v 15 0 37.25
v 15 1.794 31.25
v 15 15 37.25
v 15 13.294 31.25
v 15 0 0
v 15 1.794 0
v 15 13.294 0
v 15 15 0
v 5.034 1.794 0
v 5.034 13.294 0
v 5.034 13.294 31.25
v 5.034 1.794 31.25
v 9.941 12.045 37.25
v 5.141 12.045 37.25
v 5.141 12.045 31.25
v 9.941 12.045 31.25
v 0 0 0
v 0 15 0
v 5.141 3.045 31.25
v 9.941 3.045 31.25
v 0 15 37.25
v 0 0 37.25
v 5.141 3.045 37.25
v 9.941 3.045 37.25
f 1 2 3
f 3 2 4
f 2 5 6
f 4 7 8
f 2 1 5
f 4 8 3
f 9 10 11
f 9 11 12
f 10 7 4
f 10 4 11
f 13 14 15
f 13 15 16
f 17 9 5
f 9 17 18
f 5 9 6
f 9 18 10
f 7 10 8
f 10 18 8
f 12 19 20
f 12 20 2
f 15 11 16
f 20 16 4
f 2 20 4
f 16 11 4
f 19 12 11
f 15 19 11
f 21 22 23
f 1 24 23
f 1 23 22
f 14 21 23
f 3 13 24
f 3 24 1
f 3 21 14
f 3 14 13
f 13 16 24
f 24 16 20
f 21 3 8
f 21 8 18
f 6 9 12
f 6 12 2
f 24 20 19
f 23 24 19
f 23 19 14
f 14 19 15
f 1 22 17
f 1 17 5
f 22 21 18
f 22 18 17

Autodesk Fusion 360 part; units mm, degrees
sketch "Sketch1" plane through (0, 0, 0) normal (0, 0, 1) x (1, 0, 0)
  line L0 (0, 0) -> (15, 0)
  line L1 (15, 0) -> (15, 15)
  line L2 (15, 15) -> (0, 15)
  line L3 (0, 15) -> (0, 0)
  line L4 (5.1406, 12.0446) -> (9.9406, 12.0446)
  line L5 (9.9406, 12.0446) -> (9.9406, 3.0446)
  line L6 (9.9406, 3.0446) -> (5.1406, 3.0446)
  line L7 (5.1406, 3.0446) -> (5.1406, 12.0446)
  dimension "d1" = 15
  dimension "d2" = 15
  dimension "d3" = 4.8
  dimension "d4" = 9
extrude "Extrude1" add sketch "Sketch1" along normal blind 37.25
sketch "Sketch4" plane through (0, 0, 0) normal (0, 0, 1) x (1, 0, 0)
  line L0 (5.0344, 1.7938) -> (15.0344, 1.7938)
  line L1 (15.0344, 1.7938) -> (15.0344, 13.2938)
  line L2 (15.0344, 13.2938) -> (5.0344, 13.2938)
  line L3 (5.0344, 13.2938) -> (5.0344, 1.7938)
  dimension "d14" = 10
  dimension "d15" = 11.5
extrude "Extrude5" cut sketch "Sketch4" along normal blind 31.25
sketch "Sketch5" plane through (15, 0, 0) normal (1, 0, 0) x (0, 1, 0)
  line L0 (13.2938, 0) -> (15, 0)
  line L1 (15, 0) -> (15, 37.25)
  line L2 (15, 37.25) -> (0, 37.25)
  line L3 (0, 37.25) -> (0, 0)
  line L4 (2.5112, 0) -> (12.5112, 0)
  line L5 (12.5112, 0) -> (12.5112, 25)
  line L6 (12.5112, 25) -> (2.5112, 25)
  line L7 (2.5112, 25) -> (2.5112, 0)
  line L8 (13.2938, 31.25) -> (13.2938, 0)
  line L9 (0, 0) -> (1.7938, 0)
  line L10 (1.7938, 0) -> (1.7938, 31.25)
  line L11 (1.7938, 31.25) -> (13.2938, 31.25)
  dimension "d18" = 25
  dimension "d21" = 10
extrude "Extrude6" cut sketch "Sketch5" against normal blind 7 contours L4 L5 L6 L7
